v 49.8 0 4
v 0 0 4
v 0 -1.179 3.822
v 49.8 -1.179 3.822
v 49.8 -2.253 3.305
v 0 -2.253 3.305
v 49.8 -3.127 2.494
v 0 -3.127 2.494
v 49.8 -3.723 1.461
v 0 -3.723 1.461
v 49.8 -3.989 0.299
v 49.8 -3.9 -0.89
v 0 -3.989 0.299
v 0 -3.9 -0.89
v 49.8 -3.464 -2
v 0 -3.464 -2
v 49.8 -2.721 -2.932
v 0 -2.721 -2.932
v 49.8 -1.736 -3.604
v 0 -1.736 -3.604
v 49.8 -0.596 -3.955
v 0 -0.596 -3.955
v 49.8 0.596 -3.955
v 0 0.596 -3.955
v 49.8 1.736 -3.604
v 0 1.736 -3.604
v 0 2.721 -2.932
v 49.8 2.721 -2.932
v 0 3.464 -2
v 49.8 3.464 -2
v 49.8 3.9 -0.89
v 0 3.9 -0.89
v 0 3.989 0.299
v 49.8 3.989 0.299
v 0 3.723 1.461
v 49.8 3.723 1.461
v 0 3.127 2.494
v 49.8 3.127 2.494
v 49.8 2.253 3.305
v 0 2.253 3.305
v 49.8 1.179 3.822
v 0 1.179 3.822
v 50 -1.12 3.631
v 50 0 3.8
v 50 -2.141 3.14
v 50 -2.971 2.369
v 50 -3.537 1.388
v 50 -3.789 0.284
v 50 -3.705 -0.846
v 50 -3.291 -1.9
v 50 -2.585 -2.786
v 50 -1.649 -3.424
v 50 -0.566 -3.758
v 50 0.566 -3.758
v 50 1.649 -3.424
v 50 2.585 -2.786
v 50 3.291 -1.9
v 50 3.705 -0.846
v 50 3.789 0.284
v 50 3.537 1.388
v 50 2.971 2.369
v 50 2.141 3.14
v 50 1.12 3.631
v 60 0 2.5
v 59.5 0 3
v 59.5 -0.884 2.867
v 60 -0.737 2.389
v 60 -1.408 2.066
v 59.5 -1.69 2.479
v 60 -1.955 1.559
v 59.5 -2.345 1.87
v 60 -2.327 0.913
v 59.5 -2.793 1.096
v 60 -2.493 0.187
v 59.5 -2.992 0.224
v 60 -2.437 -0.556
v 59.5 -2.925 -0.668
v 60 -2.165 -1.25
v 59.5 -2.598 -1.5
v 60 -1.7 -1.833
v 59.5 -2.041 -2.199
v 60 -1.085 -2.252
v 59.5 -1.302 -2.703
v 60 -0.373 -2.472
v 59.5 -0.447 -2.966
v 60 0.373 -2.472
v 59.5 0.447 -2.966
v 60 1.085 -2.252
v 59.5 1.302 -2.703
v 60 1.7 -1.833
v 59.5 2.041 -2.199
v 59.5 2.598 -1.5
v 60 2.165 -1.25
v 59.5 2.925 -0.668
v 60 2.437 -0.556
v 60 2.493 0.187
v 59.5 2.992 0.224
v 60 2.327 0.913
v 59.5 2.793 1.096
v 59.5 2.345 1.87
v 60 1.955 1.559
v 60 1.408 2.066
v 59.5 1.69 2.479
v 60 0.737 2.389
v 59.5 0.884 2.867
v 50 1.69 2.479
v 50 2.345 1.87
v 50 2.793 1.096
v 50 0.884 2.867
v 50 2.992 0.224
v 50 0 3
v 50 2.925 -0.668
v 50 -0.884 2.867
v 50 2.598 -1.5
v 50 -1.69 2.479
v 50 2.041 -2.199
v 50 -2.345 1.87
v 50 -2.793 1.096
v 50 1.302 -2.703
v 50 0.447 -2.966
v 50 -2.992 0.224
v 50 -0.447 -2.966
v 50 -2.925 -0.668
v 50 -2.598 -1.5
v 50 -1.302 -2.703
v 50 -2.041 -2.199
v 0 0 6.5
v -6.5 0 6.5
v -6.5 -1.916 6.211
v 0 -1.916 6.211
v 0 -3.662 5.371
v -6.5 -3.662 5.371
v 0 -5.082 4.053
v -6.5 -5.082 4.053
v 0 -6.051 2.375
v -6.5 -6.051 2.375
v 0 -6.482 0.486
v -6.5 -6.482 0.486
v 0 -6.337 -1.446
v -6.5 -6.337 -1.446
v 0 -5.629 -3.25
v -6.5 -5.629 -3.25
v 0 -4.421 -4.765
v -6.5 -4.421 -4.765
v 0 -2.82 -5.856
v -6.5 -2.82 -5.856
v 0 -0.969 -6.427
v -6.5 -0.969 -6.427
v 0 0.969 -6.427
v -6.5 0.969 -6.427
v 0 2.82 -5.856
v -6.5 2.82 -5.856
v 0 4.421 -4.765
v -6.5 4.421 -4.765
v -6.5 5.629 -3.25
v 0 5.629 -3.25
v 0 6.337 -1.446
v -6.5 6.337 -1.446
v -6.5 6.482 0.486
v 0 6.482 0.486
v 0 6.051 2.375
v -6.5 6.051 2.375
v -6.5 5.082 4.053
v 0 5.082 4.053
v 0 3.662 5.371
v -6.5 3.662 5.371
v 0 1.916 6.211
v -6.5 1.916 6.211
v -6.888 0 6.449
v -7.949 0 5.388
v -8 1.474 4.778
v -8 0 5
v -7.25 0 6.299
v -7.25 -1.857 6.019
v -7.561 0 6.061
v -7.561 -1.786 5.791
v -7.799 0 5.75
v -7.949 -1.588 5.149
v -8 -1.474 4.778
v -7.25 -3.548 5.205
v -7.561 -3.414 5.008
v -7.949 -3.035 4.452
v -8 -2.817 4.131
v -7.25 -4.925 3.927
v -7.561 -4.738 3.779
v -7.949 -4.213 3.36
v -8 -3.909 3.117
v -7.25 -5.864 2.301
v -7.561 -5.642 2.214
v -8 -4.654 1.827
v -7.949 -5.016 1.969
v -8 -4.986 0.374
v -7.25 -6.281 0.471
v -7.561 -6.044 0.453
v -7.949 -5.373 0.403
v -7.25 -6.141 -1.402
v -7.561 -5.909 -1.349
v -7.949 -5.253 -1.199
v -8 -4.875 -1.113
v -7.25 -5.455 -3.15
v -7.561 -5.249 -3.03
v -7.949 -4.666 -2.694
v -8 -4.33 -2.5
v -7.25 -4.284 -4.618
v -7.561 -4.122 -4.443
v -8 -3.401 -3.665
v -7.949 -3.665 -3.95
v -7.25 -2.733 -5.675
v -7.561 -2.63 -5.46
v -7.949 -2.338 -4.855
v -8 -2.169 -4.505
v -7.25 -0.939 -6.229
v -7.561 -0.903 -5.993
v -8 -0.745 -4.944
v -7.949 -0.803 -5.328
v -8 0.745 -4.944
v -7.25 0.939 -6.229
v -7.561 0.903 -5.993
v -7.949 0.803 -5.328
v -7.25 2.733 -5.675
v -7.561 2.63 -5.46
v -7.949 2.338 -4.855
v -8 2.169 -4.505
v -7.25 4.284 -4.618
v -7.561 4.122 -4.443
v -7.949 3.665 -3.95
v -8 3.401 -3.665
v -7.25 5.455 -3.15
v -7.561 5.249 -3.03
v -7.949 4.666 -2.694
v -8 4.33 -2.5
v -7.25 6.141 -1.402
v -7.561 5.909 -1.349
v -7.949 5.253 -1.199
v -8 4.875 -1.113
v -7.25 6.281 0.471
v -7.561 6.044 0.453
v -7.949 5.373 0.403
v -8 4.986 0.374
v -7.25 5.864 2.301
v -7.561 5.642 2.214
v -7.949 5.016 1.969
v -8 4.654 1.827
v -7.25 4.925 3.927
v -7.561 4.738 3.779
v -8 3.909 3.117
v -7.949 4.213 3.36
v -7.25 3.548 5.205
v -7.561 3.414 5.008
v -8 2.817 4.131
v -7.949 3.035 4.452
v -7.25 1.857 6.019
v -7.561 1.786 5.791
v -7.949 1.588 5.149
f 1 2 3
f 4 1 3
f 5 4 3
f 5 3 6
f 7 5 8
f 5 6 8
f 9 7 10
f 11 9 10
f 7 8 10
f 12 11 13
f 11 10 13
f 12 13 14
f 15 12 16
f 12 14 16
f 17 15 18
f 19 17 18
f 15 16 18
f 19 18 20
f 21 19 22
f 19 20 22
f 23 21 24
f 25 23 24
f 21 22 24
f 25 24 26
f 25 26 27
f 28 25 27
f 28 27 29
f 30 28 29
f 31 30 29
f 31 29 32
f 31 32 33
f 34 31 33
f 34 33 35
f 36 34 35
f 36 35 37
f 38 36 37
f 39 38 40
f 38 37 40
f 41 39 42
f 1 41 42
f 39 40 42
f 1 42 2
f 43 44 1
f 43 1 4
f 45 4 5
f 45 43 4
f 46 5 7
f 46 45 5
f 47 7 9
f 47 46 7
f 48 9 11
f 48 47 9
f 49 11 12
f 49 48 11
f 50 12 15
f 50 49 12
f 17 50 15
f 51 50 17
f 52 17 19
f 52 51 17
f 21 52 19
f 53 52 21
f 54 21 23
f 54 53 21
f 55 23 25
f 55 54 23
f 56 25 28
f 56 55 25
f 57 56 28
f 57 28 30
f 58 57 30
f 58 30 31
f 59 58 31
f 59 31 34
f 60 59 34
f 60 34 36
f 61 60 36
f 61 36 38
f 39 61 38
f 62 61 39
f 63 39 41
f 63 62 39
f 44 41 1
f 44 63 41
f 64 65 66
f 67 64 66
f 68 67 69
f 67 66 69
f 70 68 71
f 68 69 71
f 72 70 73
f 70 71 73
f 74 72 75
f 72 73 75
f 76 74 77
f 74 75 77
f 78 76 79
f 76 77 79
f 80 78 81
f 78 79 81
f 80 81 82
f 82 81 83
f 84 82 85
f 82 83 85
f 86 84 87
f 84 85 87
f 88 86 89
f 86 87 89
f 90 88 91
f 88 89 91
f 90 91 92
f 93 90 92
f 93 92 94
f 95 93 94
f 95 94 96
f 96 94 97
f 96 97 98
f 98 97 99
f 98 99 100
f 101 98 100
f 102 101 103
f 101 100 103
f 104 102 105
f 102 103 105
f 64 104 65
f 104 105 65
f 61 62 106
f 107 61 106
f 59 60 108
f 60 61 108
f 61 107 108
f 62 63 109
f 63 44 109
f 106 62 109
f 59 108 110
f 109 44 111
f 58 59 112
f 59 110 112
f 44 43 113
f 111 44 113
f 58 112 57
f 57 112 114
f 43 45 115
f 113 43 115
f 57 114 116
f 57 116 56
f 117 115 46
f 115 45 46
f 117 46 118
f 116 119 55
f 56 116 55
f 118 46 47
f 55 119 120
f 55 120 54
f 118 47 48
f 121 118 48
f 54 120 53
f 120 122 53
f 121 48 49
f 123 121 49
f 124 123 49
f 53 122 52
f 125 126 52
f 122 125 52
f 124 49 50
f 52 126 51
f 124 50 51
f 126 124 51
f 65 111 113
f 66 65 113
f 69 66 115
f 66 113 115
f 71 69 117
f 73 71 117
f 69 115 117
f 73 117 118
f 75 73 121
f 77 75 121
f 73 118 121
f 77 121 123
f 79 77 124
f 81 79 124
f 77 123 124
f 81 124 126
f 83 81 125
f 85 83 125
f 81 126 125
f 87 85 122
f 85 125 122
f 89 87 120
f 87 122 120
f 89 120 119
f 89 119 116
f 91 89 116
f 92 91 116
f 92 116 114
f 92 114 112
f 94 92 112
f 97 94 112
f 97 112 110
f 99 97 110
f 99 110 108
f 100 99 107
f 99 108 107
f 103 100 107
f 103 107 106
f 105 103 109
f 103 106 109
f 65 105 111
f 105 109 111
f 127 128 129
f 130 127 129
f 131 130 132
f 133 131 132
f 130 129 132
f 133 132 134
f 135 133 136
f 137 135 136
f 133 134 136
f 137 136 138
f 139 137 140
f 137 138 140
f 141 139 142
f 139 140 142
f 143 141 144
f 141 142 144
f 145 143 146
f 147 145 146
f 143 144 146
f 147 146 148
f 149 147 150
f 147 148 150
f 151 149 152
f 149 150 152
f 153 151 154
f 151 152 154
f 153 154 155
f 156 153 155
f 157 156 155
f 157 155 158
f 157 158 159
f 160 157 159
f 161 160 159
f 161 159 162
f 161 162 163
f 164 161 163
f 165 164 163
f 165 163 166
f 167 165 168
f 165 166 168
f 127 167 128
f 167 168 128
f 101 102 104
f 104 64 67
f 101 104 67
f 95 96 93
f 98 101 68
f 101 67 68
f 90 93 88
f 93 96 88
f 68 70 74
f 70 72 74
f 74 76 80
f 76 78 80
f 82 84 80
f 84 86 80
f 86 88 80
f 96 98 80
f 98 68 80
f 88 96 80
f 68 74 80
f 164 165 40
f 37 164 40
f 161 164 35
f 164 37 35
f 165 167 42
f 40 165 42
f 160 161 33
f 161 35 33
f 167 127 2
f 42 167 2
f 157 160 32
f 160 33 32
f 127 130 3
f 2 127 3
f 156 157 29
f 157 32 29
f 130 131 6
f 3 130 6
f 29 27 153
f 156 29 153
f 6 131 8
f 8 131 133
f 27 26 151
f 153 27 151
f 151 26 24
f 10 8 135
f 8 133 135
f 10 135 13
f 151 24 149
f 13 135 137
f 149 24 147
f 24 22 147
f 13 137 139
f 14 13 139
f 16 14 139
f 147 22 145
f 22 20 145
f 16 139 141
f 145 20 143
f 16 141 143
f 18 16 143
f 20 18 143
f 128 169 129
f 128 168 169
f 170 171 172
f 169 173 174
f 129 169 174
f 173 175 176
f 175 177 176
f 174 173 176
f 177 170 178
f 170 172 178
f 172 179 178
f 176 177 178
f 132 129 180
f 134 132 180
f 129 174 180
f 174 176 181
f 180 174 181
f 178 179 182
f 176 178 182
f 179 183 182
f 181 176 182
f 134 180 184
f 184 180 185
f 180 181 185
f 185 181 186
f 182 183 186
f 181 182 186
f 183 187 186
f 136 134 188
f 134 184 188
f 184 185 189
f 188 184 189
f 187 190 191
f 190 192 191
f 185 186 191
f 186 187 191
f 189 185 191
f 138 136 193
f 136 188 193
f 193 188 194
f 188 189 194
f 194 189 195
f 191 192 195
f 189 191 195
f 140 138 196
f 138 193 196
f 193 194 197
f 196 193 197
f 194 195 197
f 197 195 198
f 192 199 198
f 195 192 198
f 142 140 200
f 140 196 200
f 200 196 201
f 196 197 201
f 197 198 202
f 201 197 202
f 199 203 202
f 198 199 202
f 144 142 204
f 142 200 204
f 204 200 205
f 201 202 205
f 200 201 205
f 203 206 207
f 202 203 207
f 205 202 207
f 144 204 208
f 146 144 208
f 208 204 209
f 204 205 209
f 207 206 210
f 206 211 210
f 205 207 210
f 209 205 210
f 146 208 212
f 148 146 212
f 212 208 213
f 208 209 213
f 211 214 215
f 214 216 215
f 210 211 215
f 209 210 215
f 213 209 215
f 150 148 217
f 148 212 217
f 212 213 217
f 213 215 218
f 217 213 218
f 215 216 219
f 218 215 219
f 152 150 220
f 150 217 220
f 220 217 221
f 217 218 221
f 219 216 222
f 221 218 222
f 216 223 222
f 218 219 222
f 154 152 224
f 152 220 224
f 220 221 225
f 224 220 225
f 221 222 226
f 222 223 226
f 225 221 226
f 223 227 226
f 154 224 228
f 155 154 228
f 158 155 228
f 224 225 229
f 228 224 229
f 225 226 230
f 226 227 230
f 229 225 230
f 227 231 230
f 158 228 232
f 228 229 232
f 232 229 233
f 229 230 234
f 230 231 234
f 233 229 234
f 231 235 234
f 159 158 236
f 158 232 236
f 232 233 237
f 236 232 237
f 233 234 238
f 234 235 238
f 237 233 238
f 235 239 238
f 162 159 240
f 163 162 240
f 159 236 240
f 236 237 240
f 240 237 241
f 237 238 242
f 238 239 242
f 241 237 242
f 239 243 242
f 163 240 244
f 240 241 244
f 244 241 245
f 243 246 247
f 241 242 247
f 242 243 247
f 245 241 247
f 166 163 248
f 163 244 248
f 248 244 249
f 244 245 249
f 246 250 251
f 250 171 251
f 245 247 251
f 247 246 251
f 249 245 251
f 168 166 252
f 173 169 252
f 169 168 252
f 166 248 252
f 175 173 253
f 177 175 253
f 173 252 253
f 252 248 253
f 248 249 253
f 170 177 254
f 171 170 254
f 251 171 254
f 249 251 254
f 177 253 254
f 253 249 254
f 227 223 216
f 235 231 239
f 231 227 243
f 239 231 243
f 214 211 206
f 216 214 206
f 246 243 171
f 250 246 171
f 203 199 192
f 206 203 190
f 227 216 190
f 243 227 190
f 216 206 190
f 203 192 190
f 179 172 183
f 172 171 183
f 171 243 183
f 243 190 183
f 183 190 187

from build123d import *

# Parameters (mm, degrees)
CHANFREIN1_SIZE = 0.5
CONG_1_R        = 1.5
CHANFREIN2_SIZE = 0.2


with BuildPart() as part:
    # Esquisse1 → Base-Révolution (revolve)
    with BuildSketch(Plane.XY, mode=Mode.PRIVATE) as base_r_volution_sk:
        Polygon((60, 0), (60, -3), (50, -3), (50, -4), (0, -4), (0, -6.5), (-8, -6.5), (-8, 0), align=None)
    revolve(base_r_volution_sk.sketch.rotate(Axis((0, 0, 0), (1, 0, 0)), 270), axis=Axis((0, 0, 0), (1, 0, 0)))

    # Chanfrein1
    chanfrein1_edges = [part.edges().sort_by_distance(p)[0] for p in [
        (60, 0, -3),
    ]]
    chamfer(chanfrein1_edges, length=CHANFREIN1_SIZE)

    # Congé1
    cong_1_edges = [part.edges().sort_by_distance(p)[0] for p in [
        (-8, 0, -6.5),
    ]]
    fillet(cong_1_edges, radius=CONG_1_R)

    # Chanfrein2
    chanfrein2_edges = [part.edges().sort_by_distance(p)[0] for p in [
        (50, 0, -4),
    ]]
    chamfer(chanfrein2_edges, length=CHANFREIN2_SIZE)


solid = part.part
